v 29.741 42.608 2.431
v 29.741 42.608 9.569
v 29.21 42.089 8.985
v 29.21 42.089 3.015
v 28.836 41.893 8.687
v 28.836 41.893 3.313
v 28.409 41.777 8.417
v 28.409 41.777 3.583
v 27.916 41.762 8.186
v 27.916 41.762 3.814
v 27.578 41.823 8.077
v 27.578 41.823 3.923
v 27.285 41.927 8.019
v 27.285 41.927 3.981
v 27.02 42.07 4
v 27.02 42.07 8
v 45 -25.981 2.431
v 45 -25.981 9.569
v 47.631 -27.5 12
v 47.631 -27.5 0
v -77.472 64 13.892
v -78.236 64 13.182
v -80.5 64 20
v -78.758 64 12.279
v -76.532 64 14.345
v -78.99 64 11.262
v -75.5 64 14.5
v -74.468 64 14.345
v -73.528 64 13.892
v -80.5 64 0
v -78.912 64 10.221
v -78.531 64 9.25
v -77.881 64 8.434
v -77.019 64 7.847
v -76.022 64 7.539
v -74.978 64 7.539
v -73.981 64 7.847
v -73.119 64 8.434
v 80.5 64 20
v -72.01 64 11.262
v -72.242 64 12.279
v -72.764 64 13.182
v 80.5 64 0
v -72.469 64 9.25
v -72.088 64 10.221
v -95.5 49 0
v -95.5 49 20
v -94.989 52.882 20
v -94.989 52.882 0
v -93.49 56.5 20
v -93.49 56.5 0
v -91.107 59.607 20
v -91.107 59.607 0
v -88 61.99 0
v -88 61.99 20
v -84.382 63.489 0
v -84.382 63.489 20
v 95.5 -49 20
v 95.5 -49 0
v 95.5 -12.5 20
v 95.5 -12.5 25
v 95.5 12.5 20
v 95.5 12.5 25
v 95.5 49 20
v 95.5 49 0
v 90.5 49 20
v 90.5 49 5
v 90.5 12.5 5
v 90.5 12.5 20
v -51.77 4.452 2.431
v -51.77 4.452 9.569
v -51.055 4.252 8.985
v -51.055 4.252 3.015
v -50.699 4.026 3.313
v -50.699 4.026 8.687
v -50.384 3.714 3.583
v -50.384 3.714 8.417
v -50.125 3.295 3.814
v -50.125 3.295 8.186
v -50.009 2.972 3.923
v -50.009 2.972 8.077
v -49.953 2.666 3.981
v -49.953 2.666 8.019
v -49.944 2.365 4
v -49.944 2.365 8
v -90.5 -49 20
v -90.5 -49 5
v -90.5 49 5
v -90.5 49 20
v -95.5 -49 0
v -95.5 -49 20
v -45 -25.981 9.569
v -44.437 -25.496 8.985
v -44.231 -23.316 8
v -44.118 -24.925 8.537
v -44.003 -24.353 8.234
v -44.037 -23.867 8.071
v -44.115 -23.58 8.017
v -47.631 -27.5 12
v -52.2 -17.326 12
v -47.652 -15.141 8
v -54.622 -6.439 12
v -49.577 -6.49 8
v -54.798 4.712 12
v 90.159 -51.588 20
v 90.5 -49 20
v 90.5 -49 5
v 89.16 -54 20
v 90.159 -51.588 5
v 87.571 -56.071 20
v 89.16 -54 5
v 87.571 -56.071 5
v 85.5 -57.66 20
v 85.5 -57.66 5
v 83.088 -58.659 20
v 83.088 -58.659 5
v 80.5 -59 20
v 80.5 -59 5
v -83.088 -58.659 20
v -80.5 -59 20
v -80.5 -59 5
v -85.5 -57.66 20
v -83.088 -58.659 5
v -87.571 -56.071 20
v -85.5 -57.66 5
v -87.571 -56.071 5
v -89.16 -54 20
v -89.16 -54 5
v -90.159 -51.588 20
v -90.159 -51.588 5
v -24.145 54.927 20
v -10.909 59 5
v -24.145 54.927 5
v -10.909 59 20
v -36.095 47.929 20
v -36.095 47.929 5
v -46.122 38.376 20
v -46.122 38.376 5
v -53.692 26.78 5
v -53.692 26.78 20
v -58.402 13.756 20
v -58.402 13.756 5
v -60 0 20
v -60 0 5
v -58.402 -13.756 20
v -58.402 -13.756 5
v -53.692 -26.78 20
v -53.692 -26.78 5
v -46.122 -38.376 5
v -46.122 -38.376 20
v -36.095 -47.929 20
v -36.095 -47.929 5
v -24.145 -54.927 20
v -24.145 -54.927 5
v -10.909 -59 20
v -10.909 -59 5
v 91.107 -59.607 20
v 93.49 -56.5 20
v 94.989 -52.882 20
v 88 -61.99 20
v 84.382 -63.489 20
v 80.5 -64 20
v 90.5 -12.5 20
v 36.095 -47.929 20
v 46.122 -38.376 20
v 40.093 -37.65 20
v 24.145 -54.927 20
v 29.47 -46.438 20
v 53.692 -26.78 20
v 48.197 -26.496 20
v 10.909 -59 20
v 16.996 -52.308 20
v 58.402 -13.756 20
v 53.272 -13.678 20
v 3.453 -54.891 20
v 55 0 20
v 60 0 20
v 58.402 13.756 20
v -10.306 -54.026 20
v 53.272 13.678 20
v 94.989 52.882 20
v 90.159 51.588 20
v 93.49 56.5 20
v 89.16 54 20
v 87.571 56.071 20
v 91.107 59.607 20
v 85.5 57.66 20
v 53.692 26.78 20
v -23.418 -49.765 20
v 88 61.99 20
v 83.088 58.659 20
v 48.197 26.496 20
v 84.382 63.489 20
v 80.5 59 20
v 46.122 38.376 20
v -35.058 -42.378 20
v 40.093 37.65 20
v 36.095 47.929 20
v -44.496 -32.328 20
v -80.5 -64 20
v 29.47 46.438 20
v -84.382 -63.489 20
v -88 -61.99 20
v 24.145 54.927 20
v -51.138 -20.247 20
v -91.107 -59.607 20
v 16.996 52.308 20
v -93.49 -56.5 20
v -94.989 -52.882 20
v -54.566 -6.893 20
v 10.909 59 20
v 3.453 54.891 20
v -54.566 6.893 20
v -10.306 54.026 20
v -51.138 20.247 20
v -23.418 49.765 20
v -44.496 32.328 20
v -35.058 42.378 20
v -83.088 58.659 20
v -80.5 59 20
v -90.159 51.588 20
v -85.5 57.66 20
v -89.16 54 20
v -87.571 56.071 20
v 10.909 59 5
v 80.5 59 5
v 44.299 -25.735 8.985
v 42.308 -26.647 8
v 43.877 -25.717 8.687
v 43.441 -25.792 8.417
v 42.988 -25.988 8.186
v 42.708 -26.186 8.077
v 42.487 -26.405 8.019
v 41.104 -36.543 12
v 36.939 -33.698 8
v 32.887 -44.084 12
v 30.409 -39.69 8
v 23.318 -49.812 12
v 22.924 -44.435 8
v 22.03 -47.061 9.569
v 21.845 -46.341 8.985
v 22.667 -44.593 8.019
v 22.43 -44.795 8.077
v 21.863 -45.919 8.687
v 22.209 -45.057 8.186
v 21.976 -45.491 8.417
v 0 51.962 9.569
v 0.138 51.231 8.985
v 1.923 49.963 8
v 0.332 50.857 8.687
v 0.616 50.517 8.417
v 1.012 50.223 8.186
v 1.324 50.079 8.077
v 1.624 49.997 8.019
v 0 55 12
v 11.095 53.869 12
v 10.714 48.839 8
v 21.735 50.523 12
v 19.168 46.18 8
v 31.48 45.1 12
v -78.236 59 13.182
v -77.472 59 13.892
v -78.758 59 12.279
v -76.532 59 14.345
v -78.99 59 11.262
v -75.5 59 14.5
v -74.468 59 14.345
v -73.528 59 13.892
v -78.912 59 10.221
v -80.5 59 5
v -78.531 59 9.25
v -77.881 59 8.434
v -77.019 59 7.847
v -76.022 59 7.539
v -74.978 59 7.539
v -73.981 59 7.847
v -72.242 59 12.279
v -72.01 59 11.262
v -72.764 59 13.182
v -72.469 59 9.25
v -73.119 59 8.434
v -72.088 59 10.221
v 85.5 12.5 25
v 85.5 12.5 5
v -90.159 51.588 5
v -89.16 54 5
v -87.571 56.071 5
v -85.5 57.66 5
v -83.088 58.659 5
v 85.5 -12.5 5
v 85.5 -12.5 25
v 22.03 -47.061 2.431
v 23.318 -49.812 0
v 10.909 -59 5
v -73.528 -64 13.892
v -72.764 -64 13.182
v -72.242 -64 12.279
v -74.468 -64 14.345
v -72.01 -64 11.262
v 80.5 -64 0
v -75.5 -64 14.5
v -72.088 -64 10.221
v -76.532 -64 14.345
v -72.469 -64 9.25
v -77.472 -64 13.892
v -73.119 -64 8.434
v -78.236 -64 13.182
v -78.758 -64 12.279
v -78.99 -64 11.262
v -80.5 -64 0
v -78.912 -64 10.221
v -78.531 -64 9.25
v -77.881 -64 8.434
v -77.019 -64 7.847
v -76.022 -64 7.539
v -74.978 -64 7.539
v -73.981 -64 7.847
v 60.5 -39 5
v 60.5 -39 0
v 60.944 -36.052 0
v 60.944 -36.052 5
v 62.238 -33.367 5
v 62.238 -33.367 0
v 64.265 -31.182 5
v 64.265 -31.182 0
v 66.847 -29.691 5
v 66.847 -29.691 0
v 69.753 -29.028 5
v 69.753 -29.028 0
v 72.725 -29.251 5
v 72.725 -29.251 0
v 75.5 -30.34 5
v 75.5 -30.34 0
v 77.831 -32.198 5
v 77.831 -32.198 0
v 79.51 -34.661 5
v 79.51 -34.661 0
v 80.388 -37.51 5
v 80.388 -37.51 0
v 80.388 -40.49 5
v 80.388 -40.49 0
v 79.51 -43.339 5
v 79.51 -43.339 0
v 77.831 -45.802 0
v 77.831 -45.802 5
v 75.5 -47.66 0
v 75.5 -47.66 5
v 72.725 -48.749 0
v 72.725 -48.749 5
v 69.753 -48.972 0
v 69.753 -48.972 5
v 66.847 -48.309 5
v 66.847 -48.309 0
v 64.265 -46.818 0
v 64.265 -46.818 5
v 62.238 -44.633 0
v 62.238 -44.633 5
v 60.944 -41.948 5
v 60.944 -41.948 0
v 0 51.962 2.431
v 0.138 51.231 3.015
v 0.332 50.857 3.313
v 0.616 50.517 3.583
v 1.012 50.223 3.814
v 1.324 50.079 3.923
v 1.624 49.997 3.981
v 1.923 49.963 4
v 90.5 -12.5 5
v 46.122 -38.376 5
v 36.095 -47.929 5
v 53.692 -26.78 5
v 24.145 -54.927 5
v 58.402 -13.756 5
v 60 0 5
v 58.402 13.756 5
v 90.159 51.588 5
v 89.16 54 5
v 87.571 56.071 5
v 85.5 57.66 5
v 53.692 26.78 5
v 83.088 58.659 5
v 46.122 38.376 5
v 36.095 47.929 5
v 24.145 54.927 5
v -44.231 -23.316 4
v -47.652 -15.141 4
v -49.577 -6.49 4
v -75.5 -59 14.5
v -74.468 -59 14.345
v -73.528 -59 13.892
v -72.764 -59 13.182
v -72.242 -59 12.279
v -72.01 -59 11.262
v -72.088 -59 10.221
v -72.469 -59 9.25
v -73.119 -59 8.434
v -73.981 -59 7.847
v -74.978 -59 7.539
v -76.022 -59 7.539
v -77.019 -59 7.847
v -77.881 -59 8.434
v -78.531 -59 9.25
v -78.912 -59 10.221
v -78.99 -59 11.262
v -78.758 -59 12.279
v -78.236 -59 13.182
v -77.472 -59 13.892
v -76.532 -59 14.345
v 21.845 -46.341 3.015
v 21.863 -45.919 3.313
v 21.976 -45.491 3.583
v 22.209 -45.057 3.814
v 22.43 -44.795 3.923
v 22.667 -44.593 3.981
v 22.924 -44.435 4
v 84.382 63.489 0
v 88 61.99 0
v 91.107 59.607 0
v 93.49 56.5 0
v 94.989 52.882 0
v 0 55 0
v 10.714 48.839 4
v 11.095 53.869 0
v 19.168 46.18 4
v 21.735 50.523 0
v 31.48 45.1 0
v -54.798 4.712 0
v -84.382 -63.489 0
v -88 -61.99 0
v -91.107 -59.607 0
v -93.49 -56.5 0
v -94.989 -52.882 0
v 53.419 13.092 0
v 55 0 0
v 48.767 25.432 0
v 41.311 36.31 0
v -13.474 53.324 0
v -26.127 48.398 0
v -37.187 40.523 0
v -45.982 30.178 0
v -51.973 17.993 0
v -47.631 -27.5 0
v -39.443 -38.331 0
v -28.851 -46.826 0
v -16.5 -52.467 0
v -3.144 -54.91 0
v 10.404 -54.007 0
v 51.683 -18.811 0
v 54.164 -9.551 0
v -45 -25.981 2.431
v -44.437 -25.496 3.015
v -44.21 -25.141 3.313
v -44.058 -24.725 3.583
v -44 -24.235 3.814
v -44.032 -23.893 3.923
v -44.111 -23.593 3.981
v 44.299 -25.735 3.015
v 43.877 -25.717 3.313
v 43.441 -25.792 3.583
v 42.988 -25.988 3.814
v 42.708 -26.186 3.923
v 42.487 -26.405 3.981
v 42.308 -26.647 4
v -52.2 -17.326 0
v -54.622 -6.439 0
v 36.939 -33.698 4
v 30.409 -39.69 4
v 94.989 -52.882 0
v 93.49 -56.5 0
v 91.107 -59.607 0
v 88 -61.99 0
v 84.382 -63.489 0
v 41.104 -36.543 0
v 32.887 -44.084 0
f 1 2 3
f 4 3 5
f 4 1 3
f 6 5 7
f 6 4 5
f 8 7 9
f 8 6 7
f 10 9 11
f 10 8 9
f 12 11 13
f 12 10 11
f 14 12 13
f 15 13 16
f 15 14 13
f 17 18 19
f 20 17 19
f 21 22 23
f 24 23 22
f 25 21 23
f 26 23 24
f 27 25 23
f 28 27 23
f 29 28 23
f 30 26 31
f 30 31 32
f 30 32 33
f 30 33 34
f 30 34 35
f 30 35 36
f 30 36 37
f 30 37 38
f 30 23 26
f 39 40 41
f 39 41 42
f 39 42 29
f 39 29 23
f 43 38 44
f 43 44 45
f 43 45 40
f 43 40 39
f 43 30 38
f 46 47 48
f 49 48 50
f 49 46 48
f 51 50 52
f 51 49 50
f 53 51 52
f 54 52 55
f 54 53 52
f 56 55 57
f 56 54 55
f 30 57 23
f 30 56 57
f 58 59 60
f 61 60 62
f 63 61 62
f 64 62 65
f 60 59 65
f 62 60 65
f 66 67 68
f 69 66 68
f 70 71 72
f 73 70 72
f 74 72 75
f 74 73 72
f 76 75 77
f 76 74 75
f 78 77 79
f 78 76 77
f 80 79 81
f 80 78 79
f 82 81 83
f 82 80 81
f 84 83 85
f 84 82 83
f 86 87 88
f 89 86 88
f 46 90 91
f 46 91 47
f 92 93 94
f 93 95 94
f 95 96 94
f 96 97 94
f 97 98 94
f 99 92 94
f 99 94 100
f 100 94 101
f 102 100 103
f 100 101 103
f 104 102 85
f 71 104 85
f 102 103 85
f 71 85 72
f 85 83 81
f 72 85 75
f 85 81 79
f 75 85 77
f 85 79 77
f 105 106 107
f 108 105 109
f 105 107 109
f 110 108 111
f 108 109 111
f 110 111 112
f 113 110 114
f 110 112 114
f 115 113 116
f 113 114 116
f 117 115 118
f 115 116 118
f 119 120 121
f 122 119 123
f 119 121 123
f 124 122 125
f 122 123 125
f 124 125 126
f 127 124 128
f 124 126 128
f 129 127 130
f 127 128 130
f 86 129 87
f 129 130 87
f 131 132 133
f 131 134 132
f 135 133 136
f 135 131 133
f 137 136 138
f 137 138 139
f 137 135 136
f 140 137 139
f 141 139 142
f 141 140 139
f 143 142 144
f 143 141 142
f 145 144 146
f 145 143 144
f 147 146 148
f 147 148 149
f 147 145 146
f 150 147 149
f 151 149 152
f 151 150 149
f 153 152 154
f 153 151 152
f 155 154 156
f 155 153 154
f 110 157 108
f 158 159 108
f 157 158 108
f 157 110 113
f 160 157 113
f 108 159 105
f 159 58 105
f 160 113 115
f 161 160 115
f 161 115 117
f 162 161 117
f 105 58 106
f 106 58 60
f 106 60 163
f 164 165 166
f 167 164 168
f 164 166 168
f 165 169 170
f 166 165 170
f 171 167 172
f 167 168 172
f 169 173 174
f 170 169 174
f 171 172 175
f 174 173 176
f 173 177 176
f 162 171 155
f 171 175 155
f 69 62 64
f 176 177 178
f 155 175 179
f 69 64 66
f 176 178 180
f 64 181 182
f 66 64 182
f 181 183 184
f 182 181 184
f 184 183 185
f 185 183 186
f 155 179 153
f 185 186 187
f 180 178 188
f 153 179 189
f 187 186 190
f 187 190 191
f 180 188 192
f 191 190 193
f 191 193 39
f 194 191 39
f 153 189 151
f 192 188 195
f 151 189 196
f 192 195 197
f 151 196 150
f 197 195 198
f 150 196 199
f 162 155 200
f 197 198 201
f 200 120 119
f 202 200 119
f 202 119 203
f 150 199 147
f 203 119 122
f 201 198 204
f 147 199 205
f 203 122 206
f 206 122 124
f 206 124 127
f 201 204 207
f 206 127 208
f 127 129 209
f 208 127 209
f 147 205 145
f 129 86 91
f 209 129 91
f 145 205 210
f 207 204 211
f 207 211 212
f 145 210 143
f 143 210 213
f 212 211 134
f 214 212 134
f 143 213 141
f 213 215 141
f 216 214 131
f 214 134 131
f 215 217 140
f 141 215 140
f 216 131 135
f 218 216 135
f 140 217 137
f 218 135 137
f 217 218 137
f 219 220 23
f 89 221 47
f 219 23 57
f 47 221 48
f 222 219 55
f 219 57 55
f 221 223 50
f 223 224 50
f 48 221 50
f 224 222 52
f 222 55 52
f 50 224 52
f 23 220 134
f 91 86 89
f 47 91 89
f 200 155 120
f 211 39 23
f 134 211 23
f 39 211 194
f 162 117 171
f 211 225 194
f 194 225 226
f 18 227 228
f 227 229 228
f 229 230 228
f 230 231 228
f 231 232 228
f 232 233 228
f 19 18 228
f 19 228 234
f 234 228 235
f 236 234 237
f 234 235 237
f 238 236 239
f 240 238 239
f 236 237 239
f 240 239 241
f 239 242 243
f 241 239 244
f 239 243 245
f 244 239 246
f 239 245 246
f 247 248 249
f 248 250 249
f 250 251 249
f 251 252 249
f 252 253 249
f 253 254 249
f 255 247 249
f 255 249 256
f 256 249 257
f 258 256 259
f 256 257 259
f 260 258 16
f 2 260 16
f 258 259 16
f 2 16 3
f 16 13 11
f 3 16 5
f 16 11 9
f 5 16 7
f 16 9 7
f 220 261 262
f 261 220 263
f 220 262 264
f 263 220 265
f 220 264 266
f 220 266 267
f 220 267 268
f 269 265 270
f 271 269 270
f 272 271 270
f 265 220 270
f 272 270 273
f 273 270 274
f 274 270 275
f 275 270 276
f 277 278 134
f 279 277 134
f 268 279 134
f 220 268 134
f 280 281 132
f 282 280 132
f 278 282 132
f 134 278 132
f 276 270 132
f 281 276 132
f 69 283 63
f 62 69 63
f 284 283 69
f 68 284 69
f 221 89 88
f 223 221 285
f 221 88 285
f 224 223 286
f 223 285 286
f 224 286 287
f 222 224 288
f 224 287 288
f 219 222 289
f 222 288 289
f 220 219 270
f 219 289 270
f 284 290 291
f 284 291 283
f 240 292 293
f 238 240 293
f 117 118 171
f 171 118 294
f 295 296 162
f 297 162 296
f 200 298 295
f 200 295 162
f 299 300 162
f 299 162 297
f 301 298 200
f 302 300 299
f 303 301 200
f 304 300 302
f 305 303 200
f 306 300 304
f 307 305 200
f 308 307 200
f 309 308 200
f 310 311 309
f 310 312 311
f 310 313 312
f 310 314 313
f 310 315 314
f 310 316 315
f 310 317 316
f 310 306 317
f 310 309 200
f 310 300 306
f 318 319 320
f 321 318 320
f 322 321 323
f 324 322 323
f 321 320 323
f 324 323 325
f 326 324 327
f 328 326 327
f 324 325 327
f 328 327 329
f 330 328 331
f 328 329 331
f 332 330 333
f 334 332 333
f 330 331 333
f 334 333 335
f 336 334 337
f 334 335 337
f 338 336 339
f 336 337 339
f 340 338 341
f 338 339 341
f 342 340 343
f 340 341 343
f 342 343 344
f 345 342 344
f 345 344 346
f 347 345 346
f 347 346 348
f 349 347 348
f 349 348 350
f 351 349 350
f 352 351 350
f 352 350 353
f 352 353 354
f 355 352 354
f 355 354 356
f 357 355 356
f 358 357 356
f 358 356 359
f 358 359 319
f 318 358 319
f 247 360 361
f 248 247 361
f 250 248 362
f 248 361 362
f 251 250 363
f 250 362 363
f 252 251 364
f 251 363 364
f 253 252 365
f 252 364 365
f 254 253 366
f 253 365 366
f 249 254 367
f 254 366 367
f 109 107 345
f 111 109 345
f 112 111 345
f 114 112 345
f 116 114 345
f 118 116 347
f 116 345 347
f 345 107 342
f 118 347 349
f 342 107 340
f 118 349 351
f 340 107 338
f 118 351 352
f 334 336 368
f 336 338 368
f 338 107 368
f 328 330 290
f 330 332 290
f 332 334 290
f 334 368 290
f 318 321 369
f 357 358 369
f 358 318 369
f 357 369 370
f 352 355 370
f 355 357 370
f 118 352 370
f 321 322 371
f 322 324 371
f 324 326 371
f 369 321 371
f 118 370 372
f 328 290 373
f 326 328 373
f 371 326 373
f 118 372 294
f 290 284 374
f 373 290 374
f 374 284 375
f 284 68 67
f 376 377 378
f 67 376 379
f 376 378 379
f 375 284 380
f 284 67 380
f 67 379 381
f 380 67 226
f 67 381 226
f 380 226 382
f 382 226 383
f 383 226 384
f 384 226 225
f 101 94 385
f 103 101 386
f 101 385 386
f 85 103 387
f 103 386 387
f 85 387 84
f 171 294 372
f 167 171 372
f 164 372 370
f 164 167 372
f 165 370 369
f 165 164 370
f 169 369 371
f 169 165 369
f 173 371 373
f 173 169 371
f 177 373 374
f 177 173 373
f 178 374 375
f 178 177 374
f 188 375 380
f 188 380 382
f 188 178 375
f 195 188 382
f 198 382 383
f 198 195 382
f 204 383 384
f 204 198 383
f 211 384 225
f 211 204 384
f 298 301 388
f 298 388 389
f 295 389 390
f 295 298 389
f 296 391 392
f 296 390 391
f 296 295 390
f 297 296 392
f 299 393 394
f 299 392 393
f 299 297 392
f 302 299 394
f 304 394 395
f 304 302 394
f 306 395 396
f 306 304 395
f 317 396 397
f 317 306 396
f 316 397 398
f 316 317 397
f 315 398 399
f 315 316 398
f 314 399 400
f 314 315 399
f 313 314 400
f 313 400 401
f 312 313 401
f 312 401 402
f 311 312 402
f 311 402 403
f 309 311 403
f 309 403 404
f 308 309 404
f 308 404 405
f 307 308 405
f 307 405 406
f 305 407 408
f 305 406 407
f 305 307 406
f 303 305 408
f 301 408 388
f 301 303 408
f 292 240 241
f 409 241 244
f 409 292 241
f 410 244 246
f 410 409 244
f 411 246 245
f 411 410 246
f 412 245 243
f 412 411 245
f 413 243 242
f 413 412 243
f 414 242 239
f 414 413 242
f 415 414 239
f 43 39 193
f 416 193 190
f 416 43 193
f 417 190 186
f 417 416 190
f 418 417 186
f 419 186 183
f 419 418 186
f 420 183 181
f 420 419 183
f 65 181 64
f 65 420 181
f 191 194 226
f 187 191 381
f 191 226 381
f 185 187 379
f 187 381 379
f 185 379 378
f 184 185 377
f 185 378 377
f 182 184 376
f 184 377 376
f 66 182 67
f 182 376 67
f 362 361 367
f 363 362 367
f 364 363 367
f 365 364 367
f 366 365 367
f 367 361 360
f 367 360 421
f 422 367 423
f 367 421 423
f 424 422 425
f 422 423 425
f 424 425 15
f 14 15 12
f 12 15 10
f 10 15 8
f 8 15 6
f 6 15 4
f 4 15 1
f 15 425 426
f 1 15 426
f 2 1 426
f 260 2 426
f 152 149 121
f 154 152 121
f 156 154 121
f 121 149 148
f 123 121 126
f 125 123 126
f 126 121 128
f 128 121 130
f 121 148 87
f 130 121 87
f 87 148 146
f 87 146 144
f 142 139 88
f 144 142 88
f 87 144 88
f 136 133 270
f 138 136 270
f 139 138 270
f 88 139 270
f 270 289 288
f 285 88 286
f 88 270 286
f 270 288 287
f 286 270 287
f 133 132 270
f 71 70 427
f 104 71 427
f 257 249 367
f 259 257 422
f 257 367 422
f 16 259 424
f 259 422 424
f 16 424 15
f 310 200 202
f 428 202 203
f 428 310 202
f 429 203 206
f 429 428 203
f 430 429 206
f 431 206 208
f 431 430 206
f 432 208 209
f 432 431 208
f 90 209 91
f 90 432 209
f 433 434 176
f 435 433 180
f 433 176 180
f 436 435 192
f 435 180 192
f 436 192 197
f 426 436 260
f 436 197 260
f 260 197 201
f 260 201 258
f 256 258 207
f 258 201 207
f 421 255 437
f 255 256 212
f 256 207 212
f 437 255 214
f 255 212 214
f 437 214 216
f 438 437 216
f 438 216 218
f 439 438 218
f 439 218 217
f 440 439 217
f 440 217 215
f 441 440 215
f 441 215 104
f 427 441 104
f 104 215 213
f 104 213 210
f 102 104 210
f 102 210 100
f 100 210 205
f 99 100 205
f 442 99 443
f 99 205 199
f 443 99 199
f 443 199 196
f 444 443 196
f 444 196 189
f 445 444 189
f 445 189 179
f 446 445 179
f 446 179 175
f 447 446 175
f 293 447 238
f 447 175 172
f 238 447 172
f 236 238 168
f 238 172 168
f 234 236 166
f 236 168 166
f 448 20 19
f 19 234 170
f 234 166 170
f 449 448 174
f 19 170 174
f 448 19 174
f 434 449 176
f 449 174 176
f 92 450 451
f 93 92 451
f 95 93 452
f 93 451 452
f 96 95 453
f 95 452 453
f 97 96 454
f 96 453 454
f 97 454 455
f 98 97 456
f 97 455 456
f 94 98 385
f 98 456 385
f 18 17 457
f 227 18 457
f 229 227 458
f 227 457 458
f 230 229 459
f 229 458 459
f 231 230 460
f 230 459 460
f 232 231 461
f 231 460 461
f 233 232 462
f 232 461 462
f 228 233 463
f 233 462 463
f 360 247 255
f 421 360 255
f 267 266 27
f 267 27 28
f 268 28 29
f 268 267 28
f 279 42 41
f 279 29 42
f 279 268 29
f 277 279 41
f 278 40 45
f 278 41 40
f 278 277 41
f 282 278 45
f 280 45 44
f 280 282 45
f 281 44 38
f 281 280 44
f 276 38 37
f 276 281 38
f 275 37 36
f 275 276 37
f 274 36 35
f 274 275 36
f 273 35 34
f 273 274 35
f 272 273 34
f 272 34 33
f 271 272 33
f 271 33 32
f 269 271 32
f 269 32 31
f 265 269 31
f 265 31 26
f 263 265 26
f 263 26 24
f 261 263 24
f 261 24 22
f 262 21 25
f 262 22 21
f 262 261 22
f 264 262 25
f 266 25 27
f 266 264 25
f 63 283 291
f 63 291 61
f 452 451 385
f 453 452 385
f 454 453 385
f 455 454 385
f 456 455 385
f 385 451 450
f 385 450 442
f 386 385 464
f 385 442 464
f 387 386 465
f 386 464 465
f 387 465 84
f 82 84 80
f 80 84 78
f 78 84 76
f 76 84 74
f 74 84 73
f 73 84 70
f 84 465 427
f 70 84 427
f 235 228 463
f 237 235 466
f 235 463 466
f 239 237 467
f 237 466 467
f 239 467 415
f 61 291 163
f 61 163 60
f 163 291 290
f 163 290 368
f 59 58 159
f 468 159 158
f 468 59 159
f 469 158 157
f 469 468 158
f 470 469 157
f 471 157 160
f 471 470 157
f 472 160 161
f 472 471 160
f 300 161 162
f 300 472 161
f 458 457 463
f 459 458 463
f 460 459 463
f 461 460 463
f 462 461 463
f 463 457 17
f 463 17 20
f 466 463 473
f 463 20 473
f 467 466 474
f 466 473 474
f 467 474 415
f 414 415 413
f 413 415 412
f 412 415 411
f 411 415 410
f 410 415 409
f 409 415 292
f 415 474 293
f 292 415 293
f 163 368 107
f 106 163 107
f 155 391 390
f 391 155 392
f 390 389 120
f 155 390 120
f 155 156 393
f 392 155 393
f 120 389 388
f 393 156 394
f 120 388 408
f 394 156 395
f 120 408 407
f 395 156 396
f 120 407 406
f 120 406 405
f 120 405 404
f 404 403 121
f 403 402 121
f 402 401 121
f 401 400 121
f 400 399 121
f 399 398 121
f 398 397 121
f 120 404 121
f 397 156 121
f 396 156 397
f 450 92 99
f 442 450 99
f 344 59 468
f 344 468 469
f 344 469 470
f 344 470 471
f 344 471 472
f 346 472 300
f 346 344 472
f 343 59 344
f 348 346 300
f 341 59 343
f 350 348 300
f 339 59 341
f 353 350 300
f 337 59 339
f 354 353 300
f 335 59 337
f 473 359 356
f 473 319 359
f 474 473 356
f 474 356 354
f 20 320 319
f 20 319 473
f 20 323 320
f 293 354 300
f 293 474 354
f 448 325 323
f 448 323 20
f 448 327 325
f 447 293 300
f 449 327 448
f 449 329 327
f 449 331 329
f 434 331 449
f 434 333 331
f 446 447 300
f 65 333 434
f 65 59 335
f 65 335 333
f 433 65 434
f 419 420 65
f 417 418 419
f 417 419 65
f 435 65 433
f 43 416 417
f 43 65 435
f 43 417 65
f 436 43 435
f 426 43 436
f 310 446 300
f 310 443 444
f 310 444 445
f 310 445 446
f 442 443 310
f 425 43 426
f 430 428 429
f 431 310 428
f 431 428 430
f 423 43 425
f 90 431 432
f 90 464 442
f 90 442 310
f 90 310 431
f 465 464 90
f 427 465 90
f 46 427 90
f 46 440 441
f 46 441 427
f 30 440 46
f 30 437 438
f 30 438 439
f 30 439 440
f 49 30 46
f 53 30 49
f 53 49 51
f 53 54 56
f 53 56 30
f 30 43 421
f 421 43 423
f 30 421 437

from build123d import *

# Parameters (mm, degrees)
BOSS_EXTRUDE1_DEPTH      = 20
SKETCH2_R                = 55
CUT_EXTRUDE1_DEPTH       = 117.688688398
SHELL1_T                 = -5
FILLET1_R                = 2
CIRPATTERN1_COUNT        = 3
FILLET1_OF_CIRPATTERN1_R = 2
SKETCH5_R                = 10
CUT_EXTRUDE2_DEPTH       = 117.688688398
CUT_EXTRUDE3_DEPTH       = 117.688688398
CUT_EXTRUDE3_DEPTH_BACK  = 117.688688398
SKETCH6_R                = 3.5
SKETCH7_W                = 10
SKETCH7_H                = 25
BOSS_EXTRUDE2_DEPTH      = 20


with BuildPart() as part:
    # Sketch1 → Boss-Extrude1 (new body)
    with BuildSketch(Plane.XY):
        with BuildLine():
            Line((-80.5, 64), (80.5, 64))
            ThreePointArc((80.5, 64), (91.106601718, 59.606601718), (95.5, 49))
            Line((95.5, 49), (95.5, -49))
            ThreePointArc((95.5, -49), (91.106601718, -59.606601718), (80.5, -64))
            Line((80.5, -64), (-80.5, -64))
            ThreePointArc((-80.5, -64), (-91.106601718, -59.606601718), (-95.5, -49))
            Line((-95.5, -49), (-95.5, 49))
            ThreePointArc((-95.5, 49), (-91.106601718, 59.606601718), (-80.5, 64))
        make_face()
    extrude(amount=BOSS_EXTRUDE1_DEPTH)

    # Sketch2 → Cut-Extrude1 (cut, through all)
    with BuildSketch(Plane.XY.offset(20)):
        Circle(SKETCH2_R)
    extrude(amount=-CUT_EXTRUDE1_DEPTH, mode=Mode.SUBTRACT)

    # Shell1
    shell1_openings = [part.faces().sort_by_distance(p)[0] for p in [
        (0, 61.700760995, 20),
    ]]
    offset(amount=SHELL1_T, openings=shell1_openings)

    # Sweep1: sweep along a path in Sketch4
    with BuildLine(Plane.XY) as sweep1_path:
        ThreePointArc((0, 50), (15, 47.696960071), (28.618176043, 41))
    # Sketch3 → Sweep1 (sweep)
    with BuildSketch(Plane(origin=(0, 0, 0), x_dir=(0, 0, -1), z_dir=(1, 0, 0))):
        Polygon((0, 55), (-12, 55), (-8, 50), (-4, 50), align=None)
    sweep1 = sweep(path=sweep1_path.line)

    # Fillet1
    fillet1_edges = [part.edges().sort_by_distance(p)[0] for p in [
        (28.618176043, 41, 6),
        (0, 50, 6),
    ]]
    fillet(fillet1_edges, radius=FILLET1_R)

    # CirPattern1: Sweep1 ×3 about axis
    cirpattern1_axis = Axis((0, 0, 0), (0, 0, 1))
    for i in range(1, CIRPATTERN1_COUNT):
        add(sweep1.rotate(cirpattern1_axis, i * 360 / CIRPATTERN1_COUNT))

    # Fillet1 of CirPattern1
    fillet1_of_cirpattern1_edges = [part.edges().sort_by_distance(p)[0] for p in [
        (-49.816129576, 4.284067463, 6),
        (-43.301270189, -25, 6),
        (21.197953534, -45.284067463, 6),
        (43.301270189, -25, 6),
    ]]
    fillet(fillet1_of_cirpattern1_edges, radius=FILLET1_OF_CIRPATTERN1_R)

    # Sketch5 → Cut-Extrude2 (cut, through all)
    with BuildSketch(Plane(origin=(0, 0, 0), x_dir=(-1, 0, 0), z_dir=(0, 0, -1))):
        with Locations((-70.5, -39)):
            Circle(SKETCH5_R)
    extrude(amount=-CUT_EXTRUDE2_DEPTH, mode=Mode.SUBTRACT)

    # Sketch6 → Cut-Extrude3 (cut, two sides: drawn at the far end of the back side and taken through both)
    with BuildSketch(Plane(origin=(0, 0, 0), x_dir=(1, 0, 0), z_dir=(0, 1, 0)).offset(-CUT_EXTRUDE3_DEPTH_BACK)):
        with Locations(Location((-75.5, -11, 0), (0, 0, 270))):
            Circle(SKETCH6_R)
    extrude(amount=CUT_EXTRUDE3_DEPTH + CUT_EXTRUDE3_DEPTH_BACK, mode=Mode.SUBTRACT)

    # Sketch7 → Boss-Extrude2 (add)
    with BuildSketch(Plane.XY.offset(5)):
        with Locations((90.5, 0)):
            Rectangle(SKETCH7_W, SKETCH7_H)
    extrude(amount=BOSS_EXTRUDE2_DEPTH)


solid = part.part
